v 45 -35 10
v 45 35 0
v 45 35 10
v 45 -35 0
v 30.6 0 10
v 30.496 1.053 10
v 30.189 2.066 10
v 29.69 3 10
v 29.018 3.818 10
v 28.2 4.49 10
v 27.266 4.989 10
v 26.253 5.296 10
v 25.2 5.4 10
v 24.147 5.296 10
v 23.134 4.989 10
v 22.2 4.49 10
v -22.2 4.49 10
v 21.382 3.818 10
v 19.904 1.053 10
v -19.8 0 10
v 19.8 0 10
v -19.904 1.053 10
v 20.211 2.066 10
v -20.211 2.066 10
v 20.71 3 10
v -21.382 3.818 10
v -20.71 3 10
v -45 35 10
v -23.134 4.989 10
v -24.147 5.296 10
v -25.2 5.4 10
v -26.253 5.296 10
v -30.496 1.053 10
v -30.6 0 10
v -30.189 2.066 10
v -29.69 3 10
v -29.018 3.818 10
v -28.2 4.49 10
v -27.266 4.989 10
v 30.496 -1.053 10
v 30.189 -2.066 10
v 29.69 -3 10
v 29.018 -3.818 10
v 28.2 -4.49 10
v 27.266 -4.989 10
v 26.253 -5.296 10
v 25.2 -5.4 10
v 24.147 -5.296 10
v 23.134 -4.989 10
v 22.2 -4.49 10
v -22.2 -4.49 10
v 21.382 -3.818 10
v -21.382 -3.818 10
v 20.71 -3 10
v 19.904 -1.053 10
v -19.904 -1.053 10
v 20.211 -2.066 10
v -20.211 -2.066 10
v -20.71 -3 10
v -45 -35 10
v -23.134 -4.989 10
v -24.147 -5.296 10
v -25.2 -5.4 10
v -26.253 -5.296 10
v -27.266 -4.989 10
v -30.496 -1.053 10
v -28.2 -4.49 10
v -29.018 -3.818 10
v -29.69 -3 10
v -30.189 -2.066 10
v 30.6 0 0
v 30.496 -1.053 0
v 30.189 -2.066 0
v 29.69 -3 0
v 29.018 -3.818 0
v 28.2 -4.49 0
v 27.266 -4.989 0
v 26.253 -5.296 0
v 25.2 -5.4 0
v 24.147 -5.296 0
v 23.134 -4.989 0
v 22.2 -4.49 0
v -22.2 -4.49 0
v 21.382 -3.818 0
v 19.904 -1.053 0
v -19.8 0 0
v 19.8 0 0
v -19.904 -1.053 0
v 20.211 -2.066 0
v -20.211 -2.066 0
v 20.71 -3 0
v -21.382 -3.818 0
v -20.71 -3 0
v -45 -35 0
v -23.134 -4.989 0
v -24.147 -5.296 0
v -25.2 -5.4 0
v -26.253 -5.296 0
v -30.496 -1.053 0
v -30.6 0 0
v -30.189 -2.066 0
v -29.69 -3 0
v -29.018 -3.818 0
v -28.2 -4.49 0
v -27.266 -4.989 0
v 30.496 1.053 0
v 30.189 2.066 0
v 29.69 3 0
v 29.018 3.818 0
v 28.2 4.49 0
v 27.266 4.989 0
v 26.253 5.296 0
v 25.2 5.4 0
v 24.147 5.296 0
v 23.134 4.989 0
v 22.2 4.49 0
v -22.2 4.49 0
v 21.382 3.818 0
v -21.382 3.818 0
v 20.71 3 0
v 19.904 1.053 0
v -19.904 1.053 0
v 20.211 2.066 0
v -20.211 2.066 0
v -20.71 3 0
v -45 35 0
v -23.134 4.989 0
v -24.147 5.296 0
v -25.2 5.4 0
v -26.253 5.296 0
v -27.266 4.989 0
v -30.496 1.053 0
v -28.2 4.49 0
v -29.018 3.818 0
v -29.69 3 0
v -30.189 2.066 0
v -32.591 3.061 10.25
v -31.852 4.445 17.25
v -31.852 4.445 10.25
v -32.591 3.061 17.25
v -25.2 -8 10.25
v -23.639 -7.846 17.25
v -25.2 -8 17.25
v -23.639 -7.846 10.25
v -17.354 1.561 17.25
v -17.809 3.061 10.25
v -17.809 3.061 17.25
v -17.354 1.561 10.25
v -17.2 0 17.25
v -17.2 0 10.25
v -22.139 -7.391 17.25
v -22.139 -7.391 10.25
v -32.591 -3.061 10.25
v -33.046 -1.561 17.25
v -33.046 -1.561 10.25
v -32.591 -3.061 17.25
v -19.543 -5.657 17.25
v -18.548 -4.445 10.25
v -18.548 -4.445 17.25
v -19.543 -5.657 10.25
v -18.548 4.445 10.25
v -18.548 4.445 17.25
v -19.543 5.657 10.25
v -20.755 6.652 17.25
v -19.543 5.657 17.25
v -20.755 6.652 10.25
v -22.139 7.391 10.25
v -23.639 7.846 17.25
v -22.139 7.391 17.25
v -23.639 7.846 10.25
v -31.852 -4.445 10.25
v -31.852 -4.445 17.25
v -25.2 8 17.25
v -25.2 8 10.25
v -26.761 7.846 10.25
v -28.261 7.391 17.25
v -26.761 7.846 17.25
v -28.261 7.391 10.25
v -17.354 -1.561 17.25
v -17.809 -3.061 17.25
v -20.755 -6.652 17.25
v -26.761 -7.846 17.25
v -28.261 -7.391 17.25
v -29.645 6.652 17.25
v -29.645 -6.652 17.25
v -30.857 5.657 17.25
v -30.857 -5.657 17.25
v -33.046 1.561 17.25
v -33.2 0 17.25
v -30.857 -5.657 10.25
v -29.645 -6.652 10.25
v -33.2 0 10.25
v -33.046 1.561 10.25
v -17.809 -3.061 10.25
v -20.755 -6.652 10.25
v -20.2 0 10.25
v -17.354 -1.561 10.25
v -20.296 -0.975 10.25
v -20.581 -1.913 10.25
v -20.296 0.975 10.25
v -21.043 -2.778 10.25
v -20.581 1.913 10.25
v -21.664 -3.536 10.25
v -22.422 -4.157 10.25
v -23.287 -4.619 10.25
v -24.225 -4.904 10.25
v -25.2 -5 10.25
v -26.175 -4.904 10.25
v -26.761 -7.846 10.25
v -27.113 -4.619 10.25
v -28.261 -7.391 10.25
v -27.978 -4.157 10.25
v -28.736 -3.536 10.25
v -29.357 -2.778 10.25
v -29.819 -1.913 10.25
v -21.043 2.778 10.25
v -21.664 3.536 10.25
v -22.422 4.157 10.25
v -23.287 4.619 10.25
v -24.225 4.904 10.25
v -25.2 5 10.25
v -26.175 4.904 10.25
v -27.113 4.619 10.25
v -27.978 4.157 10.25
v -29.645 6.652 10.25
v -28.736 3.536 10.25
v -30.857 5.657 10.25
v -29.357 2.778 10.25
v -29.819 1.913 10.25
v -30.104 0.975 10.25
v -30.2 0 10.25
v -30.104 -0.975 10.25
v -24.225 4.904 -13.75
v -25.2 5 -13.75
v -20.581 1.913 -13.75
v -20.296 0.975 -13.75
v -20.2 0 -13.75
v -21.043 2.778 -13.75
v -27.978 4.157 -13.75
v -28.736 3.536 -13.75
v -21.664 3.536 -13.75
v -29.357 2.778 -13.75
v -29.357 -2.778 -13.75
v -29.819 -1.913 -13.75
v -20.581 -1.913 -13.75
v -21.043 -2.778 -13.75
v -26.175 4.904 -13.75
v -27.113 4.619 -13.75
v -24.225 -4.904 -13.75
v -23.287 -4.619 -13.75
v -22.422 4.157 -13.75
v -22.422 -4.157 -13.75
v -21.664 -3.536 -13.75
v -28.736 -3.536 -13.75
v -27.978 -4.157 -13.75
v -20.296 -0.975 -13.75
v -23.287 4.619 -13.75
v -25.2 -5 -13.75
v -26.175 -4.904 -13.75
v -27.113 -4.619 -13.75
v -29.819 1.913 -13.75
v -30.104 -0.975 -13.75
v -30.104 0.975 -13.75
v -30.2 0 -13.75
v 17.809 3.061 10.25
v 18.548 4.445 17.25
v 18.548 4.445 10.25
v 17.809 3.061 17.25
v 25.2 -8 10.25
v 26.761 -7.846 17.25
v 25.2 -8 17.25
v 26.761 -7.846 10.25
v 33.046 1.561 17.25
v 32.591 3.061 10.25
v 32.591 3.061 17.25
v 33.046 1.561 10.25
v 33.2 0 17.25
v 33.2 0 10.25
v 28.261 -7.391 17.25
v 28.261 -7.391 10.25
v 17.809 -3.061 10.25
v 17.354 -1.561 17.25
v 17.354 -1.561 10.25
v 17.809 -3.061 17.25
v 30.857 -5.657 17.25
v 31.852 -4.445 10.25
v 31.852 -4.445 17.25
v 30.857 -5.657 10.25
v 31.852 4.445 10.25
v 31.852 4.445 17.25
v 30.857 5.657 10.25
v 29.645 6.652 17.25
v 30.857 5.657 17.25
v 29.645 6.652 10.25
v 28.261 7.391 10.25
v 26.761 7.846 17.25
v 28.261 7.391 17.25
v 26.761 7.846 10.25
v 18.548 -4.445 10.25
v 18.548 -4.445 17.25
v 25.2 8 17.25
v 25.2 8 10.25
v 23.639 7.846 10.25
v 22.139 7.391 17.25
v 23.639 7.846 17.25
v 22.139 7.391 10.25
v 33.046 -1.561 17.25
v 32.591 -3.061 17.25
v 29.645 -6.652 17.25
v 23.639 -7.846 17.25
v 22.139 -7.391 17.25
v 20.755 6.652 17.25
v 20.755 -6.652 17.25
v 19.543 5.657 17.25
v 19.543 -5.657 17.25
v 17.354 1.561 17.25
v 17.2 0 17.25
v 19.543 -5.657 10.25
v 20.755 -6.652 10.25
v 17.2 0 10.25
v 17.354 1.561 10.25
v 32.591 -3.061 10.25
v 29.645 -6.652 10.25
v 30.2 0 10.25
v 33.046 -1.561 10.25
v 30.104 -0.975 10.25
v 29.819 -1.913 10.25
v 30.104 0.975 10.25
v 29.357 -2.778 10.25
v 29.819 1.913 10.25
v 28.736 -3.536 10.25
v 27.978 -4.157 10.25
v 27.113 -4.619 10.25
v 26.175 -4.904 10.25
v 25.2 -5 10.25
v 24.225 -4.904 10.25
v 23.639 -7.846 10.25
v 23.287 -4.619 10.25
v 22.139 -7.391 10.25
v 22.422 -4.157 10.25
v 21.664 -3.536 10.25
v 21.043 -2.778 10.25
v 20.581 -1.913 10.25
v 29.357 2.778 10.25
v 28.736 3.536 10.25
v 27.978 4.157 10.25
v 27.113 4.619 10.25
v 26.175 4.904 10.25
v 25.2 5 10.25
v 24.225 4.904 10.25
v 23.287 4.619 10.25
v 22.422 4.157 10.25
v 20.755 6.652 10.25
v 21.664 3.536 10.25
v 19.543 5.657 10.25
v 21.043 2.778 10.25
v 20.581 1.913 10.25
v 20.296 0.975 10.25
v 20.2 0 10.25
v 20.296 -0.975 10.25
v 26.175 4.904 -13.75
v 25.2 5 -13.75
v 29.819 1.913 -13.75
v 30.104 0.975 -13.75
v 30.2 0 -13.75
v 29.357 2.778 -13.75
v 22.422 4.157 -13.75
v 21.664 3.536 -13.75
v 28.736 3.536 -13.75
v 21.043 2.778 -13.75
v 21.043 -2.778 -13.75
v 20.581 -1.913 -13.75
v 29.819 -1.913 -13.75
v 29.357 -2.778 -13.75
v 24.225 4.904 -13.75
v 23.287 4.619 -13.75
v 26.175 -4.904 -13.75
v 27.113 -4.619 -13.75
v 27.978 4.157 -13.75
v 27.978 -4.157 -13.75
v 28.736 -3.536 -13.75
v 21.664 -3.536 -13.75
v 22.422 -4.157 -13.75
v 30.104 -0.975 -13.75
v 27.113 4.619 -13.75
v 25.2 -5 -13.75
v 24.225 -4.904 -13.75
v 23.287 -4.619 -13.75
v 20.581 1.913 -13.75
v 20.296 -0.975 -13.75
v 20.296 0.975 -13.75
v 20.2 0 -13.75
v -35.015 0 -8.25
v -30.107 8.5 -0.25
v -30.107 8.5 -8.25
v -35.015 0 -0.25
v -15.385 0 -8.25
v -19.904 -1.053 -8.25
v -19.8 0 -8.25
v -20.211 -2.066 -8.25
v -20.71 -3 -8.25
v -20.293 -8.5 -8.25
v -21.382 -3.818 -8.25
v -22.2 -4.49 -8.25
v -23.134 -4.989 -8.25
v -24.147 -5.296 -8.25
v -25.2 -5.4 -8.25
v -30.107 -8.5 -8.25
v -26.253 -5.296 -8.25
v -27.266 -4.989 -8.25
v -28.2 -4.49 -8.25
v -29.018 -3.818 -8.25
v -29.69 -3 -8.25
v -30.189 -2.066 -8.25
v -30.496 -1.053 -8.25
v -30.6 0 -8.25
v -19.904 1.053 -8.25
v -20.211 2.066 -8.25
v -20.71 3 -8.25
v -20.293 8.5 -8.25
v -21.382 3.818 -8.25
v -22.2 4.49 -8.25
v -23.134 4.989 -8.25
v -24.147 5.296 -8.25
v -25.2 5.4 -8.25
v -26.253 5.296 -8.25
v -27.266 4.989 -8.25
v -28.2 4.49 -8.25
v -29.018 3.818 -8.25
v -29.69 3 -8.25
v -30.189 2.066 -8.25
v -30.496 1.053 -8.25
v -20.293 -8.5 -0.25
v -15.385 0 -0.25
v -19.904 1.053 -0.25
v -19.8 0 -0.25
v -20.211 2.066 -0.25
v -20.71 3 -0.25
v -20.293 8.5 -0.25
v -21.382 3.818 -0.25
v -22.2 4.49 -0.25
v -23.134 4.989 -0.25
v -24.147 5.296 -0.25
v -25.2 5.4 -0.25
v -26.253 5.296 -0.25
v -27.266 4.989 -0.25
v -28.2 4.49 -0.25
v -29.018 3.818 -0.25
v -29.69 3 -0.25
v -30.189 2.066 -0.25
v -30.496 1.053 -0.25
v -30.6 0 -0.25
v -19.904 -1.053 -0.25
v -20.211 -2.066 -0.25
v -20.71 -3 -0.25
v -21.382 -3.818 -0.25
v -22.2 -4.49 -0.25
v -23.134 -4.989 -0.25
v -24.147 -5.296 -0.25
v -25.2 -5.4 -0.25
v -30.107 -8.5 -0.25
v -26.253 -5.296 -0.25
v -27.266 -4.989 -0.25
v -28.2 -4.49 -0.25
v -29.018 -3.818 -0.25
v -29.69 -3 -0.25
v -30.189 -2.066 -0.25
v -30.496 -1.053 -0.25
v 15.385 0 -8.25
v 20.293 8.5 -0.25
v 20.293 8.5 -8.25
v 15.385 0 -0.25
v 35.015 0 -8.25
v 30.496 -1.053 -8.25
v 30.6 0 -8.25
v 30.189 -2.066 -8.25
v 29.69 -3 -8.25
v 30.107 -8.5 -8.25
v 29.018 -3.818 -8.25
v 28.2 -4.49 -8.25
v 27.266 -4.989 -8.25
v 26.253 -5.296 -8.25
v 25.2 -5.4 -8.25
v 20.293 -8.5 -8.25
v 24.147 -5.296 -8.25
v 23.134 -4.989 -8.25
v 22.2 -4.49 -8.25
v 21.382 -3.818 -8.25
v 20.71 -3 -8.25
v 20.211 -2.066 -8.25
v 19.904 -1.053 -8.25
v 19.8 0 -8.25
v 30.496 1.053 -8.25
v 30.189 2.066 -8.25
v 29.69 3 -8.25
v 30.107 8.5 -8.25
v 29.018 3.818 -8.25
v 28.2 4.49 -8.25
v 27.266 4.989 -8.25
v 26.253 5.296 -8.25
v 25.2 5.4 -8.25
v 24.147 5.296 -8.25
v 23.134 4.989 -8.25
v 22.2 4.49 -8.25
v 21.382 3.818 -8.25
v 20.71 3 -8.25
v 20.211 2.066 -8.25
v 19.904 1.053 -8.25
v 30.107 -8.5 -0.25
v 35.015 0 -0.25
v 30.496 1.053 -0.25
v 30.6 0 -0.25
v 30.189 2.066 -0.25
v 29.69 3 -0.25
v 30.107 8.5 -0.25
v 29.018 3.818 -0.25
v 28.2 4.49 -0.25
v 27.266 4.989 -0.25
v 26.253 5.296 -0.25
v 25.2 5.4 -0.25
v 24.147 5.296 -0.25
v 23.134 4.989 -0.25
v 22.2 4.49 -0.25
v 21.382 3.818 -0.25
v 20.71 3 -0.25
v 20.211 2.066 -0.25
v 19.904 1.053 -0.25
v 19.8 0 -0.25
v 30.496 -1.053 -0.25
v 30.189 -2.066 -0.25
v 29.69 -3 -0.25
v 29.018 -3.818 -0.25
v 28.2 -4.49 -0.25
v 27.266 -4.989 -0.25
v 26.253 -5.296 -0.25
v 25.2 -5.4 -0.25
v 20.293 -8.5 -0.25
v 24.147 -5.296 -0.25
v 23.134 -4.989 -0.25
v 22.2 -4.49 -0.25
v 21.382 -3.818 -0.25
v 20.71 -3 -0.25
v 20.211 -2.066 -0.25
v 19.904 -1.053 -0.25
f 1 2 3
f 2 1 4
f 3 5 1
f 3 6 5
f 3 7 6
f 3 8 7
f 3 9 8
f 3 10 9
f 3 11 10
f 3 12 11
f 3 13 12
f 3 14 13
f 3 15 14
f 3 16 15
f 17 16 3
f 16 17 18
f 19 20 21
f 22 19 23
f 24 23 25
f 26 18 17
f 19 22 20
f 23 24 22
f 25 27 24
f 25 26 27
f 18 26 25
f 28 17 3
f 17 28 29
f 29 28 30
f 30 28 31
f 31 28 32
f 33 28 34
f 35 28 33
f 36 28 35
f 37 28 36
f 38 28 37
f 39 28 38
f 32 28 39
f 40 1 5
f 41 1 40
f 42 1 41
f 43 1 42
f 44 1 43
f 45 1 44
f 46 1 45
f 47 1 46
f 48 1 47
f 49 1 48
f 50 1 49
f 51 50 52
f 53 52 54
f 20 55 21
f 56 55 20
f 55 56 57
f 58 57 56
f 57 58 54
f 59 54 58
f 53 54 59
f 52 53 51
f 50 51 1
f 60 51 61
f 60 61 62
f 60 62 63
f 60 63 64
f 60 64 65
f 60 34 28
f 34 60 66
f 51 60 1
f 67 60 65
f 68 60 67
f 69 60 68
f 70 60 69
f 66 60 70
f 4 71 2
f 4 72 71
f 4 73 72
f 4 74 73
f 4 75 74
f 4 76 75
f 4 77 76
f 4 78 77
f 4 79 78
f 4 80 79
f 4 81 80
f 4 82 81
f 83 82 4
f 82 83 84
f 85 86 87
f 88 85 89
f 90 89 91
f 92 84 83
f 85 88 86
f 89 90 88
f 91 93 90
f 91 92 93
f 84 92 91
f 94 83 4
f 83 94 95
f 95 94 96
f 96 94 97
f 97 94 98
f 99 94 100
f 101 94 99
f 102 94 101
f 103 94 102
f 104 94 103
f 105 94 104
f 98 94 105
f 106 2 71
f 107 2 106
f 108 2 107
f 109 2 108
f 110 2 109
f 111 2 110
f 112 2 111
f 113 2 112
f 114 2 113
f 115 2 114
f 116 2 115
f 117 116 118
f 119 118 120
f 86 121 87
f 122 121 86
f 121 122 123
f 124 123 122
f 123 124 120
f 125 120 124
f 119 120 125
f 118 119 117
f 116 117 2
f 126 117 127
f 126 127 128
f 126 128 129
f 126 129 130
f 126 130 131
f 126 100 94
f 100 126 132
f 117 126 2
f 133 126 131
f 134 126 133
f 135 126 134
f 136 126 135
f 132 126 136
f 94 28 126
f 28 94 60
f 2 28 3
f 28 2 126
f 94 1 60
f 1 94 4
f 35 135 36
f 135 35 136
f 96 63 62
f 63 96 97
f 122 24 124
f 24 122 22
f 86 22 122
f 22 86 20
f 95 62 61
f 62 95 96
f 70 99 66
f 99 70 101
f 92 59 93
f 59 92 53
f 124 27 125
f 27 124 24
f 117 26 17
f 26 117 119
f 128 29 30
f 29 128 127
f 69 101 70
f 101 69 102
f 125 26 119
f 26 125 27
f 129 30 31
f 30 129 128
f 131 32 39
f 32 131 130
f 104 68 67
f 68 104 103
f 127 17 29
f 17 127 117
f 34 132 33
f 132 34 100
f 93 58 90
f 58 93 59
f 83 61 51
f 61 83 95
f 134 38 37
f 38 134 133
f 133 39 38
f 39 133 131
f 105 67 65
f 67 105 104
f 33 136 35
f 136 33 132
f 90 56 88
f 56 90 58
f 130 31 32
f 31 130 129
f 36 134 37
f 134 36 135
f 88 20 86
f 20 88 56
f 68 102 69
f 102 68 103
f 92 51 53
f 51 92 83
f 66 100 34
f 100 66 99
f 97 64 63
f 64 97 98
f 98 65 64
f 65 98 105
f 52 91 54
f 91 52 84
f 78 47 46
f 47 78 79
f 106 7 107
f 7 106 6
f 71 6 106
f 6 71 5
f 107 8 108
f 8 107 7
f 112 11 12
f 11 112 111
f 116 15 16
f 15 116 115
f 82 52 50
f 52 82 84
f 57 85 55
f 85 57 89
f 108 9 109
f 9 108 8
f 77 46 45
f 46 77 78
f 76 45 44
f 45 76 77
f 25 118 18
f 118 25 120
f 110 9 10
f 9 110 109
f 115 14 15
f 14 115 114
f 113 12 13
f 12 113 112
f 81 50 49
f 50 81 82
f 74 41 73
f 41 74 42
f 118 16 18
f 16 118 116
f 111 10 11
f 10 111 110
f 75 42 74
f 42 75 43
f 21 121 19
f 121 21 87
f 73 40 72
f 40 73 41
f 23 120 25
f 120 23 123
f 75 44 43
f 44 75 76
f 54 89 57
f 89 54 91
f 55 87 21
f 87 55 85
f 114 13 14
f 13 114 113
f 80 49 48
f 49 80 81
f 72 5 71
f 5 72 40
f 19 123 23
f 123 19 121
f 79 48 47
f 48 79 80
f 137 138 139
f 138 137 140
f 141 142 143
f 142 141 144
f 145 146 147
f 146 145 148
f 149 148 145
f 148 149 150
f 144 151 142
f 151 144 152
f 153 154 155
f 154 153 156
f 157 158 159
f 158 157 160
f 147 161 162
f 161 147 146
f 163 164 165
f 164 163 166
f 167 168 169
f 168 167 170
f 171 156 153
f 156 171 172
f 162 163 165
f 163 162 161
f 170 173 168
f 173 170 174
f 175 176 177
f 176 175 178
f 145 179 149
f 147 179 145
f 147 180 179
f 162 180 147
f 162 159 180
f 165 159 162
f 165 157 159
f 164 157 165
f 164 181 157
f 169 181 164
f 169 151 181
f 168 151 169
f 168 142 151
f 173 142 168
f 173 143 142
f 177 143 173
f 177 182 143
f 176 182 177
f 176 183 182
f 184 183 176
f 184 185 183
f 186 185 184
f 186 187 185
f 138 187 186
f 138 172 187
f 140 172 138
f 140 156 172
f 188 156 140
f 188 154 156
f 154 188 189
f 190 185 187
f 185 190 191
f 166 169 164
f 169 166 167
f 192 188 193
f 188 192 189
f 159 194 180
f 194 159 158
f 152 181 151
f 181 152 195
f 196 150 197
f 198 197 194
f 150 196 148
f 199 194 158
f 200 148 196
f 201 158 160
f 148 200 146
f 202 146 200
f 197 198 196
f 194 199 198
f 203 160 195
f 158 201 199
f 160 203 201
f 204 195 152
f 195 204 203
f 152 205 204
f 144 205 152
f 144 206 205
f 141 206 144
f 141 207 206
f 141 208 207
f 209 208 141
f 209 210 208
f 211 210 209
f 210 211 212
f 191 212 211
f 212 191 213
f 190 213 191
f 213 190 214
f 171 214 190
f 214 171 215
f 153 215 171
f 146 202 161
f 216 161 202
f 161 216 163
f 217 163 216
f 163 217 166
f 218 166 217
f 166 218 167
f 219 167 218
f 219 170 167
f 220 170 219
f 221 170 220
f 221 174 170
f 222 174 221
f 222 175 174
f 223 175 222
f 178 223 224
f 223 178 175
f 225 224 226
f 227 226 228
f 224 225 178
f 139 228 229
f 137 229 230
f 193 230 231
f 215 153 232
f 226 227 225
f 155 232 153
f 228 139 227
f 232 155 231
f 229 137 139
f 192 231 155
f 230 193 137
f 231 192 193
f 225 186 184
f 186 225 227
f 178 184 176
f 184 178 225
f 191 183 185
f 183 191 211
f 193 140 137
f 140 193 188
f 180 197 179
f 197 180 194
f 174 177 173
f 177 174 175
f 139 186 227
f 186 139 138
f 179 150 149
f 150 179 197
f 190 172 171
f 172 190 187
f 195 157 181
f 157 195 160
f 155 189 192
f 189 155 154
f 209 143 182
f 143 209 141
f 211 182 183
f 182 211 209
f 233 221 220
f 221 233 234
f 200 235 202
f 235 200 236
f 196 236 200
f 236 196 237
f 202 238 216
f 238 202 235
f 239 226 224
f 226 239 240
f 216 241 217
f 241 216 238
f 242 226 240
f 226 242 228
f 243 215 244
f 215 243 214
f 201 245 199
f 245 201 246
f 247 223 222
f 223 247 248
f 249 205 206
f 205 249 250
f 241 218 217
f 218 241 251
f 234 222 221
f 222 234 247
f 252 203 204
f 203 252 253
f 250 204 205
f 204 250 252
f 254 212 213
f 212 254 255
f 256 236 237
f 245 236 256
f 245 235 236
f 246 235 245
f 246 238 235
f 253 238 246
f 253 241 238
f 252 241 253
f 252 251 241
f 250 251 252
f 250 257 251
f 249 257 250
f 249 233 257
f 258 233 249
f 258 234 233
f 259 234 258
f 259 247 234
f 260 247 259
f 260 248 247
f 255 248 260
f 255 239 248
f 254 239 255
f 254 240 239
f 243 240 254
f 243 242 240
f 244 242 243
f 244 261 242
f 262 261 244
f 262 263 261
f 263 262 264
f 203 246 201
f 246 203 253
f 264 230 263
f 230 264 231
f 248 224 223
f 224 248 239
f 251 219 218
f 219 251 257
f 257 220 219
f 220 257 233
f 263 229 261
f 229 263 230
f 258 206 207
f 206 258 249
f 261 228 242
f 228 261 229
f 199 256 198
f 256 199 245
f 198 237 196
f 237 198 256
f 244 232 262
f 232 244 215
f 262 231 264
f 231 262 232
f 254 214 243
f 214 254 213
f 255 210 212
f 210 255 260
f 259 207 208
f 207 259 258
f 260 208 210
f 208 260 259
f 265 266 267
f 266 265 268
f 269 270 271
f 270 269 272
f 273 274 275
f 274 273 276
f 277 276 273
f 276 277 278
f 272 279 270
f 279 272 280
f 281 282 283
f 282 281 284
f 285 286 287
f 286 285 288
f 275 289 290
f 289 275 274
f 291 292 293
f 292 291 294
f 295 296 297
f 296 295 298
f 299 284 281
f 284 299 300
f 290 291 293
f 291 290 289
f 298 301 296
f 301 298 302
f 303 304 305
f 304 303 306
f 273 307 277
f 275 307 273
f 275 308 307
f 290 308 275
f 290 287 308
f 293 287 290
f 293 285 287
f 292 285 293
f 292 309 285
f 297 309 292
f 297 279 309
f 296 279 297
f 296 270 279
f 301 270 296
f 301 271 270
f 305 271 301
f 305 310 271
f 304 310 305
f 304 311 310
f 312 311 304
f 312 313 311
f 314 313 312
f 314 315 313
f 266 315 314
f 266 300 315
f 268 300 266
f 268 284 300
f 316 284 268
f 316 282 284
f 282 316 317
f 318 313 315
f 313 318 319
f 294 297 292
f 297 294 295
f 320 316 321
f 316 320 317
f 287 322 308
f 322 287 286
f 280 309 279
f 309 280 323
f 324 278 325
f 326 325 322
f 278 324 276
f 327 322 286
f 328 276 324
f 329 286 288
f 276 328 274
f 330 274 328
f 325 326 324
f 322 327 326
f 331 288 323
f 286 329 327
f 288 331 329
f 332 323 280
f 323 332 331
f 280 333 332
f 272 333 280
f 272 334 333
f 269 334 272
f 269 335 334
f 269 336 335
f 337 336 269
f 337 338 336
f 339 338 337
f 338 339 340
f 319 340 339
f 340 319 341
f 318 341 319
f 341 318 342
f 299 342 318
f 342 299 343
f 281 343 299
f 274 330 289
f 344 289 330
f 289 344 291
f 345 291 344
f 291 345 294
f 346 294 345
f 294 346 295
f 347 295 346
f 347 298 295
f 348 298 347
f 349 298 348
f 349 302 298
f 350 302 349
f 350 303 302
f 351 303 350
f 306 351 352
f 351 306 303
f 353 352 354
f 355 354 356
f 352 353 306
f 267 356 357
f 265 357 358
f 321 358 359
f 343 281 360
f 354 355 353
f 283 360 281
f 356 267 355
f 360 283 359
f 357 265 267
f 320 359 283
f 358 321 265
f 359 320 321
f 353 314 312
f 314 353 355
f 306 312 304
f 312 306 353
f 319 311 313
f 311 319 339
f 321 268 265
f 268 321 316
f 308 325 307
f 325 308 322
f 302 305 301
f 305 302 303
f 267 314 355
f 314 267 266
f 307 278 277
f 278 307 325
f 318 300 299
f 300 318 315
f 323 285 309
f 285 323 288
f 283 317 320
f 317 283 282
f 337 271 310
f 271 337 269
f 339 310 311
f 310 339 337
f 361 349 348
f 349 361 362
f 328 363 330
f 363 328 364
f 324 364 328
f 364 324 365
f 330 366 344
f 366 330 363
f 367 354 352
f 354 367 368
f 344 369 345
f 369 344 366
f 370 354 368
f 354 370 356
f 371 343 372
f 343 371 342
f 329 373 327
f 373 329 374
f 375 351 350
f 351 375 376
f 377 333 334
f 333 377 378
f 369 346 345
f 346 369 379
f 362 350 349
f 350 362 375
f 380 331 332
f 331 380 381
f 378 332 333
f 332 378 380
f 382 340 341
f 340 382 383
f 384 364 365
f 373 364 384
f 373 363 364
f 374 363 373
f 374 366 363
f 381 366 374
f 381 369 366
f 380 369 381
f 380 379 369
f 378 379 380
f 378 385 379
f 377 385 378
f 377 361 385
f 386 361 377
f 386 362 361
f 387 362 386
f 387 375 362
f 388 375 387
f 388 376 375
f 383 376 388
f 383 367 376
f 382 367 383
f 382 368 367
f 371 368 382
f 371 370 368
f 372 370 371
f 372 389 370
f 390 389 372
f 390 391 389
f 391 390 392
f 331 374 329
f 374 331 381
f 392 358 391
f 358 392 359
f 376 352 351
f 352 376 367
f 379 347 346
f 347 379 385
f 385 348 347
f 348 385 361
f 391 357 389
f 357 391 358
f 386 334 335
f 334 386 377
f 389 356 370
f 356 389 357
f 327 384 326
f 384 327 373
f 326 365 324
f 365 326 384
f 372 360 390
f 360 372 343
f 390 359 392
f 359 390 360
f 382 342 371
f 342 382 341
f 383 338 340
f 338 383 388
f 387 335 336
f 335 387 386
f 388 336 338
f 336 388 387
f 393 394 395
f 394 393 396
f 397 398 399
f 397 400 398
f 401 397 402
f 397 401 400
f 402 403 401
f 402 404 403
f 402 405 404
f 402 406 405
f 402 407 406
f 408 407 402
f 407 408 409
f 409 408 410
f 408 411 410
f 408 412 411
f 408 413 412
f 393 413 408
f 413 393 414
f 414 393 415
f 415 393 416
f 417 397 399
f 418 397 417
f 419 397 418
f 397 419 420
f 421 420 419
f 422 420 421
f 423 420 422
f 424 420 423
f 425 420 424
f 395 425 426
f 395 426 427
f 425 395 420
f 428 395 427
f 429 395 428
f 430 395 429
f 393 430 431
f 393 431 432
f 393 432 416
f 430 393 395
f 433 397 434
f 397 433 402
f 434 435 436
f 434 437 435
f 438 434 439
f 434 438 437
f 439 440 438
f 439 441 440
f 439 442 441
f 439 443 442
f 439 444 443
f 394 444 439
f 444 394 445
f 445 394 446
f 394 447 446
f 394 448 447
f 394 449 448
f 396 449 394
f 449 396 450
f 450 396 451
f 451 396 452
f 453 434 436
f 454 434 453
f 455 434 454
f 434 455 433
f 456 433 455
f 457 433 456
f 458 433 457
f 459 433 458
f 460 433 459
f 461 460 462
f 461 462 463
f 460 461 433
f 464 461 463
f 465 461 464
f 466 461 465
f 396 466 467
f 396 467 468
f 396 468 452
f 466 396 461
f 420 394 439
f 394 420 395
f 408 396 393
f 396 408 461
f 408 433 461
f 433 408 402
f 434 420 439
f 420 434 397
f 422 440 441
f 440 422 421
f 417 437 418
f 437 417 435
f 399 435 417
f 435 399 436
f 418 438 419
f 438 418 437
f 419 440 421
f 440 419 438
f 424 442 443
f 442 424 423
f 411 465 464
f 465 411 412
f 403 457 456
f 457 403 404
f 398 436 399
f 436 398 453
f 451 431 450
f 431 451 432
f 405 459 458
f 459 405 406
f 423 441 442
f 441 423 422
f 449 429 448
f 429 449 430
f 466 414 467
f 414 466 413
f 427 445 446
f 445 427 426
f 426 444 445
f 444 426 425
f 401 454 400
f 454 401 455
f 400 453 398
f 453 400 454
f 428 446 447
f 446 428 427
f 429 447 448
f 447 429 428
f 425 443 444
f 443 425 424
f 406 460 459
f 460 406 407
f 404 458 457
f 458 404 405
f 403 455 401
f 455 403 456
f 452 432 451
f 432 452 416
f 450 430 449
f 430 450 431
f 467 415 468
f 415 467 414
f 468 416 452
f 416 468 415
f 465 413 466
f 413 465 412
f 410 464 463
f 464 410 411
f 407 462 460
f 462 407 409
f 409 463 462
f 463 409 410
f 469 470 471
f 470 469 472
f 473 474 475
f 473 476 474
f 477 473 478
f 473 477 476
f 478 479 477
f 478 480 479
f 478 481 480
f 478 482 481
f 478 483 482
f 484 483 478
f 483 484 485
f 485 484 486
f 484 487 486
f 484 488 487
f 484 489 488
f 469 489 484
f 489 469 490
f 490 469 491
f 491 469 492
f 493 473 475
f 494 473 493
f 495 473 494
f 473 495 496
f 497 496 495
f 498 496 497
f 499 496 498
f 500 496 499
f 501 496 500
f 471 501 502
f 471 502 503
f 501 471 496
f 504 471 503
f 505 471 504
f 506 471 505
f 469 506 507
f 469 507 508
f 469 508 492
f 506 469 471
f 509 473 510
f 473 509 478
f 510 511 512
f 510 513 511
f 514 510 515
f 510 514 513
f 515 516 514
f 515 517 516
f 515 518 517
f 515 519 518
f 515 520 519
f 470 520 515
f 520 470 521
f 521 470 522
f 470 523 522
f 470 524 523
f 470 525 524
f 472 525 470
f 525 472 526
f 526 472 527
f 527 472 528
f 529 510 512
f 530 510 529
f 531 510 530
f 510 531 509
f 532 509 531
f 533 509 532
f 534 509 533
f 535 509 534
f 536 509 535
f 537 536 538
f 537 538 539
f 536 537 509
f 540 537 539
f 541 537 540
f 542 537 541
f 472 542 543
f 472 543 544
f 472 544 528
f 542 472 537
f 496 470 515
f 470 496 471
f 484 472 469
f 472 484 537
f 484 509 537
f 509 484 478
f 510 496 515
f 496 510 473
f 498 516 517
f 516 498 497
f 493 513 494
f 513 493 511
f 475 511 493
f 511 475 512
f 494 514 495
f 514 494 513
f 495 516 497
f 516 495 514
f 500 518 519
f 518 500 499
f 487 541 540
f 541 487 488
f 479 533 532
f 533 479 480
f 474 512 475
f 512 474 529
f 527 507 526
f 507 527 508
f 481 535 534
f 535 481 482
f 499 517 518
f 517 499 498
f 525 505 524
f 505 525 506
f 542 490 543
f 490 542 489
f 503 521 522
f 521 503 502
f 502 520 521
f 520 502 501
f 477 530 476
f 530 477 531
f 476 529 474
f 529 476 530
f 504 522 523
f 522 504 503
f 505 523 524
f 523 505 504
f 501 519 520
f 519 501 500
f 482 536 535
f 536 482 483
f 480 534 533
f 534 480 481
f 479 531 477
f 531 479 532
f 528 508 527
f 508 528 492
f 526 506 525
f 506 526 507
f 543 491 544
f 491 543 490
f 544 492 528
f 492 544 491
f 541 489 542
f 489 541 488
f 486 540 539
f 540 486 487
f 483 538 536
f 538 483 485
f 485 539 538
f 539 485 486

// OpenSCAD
$fn = 32;

// ------------------------------------------------------------------------
// Bolted plate: 90 x 70 x 10 mm plate, 2 fasteners
// Every part is its own module, assembly() places them once.
// ------------------------------------------------------------------------

// --- part 1 ---
module plate() {
  difference() {
    translate([-45, -35, 0]) cube([90, 70, 10]);
    translate([-25.2, 0, -1]) cylinder(h = 12, d = 10.8);
    translate([25.2, 0, -1]) cylinder(h = 12, d = 10.8);
  }
}

// --- part 2 ---
module bolt1() {
  cylinder(h = 7, d = 16);
  translate([0, 0, -24]) cylinder(h = 24, d = 10);
}

// --- part 3 ---
module bolt2() {
  cylinder(h = 7, d = 16);
  translate([0, 0, -24]) cylinder(h = 24, d = 10);
}

// --- part 4 ---
module nut1() {
  difference() {
    linear_extrude(height = 8) polygon(points = [[9.815, 0], [4.907, 8.5], [-4.907, 8.5], [-9.815, 0], [-4.907, -8.5], [4.907, -8.5]]);
    translate([0, 0, -1]) cylinder(h = 10, d = 10.8);
  }
}

// --- part 5 ---
module nut2() {
  difference() {
    linear_extrude(height = 8) polygon(points = [[9.815, 0], [4.907, 8.5], [-4.907, 8.5], [-9.815, 0], [-4.907, -8.5], [4.907, -8.5]]);
    translate([0, 0, -1]) cylinder(h = 10, d = 10.8);
  }
}

// --- assembly ---
module assembly() {
  translate([0, 0, 0]) rotate([0, 0, 0]) plate();
  translate([-25.2, 0, 10.25]) rotate([0, 0, 0]) bolt1();
  translate([25.2, 0, 10.25]) rotate([0, 0, 0]) bolt2();
  translate([-25.2, 0, -8.25]) rotate([0, 0, 0]) nut1();
  translate([25.2, 0, -8.25]) rotate([0, 0, 0]) nut2();
}

assembly();
